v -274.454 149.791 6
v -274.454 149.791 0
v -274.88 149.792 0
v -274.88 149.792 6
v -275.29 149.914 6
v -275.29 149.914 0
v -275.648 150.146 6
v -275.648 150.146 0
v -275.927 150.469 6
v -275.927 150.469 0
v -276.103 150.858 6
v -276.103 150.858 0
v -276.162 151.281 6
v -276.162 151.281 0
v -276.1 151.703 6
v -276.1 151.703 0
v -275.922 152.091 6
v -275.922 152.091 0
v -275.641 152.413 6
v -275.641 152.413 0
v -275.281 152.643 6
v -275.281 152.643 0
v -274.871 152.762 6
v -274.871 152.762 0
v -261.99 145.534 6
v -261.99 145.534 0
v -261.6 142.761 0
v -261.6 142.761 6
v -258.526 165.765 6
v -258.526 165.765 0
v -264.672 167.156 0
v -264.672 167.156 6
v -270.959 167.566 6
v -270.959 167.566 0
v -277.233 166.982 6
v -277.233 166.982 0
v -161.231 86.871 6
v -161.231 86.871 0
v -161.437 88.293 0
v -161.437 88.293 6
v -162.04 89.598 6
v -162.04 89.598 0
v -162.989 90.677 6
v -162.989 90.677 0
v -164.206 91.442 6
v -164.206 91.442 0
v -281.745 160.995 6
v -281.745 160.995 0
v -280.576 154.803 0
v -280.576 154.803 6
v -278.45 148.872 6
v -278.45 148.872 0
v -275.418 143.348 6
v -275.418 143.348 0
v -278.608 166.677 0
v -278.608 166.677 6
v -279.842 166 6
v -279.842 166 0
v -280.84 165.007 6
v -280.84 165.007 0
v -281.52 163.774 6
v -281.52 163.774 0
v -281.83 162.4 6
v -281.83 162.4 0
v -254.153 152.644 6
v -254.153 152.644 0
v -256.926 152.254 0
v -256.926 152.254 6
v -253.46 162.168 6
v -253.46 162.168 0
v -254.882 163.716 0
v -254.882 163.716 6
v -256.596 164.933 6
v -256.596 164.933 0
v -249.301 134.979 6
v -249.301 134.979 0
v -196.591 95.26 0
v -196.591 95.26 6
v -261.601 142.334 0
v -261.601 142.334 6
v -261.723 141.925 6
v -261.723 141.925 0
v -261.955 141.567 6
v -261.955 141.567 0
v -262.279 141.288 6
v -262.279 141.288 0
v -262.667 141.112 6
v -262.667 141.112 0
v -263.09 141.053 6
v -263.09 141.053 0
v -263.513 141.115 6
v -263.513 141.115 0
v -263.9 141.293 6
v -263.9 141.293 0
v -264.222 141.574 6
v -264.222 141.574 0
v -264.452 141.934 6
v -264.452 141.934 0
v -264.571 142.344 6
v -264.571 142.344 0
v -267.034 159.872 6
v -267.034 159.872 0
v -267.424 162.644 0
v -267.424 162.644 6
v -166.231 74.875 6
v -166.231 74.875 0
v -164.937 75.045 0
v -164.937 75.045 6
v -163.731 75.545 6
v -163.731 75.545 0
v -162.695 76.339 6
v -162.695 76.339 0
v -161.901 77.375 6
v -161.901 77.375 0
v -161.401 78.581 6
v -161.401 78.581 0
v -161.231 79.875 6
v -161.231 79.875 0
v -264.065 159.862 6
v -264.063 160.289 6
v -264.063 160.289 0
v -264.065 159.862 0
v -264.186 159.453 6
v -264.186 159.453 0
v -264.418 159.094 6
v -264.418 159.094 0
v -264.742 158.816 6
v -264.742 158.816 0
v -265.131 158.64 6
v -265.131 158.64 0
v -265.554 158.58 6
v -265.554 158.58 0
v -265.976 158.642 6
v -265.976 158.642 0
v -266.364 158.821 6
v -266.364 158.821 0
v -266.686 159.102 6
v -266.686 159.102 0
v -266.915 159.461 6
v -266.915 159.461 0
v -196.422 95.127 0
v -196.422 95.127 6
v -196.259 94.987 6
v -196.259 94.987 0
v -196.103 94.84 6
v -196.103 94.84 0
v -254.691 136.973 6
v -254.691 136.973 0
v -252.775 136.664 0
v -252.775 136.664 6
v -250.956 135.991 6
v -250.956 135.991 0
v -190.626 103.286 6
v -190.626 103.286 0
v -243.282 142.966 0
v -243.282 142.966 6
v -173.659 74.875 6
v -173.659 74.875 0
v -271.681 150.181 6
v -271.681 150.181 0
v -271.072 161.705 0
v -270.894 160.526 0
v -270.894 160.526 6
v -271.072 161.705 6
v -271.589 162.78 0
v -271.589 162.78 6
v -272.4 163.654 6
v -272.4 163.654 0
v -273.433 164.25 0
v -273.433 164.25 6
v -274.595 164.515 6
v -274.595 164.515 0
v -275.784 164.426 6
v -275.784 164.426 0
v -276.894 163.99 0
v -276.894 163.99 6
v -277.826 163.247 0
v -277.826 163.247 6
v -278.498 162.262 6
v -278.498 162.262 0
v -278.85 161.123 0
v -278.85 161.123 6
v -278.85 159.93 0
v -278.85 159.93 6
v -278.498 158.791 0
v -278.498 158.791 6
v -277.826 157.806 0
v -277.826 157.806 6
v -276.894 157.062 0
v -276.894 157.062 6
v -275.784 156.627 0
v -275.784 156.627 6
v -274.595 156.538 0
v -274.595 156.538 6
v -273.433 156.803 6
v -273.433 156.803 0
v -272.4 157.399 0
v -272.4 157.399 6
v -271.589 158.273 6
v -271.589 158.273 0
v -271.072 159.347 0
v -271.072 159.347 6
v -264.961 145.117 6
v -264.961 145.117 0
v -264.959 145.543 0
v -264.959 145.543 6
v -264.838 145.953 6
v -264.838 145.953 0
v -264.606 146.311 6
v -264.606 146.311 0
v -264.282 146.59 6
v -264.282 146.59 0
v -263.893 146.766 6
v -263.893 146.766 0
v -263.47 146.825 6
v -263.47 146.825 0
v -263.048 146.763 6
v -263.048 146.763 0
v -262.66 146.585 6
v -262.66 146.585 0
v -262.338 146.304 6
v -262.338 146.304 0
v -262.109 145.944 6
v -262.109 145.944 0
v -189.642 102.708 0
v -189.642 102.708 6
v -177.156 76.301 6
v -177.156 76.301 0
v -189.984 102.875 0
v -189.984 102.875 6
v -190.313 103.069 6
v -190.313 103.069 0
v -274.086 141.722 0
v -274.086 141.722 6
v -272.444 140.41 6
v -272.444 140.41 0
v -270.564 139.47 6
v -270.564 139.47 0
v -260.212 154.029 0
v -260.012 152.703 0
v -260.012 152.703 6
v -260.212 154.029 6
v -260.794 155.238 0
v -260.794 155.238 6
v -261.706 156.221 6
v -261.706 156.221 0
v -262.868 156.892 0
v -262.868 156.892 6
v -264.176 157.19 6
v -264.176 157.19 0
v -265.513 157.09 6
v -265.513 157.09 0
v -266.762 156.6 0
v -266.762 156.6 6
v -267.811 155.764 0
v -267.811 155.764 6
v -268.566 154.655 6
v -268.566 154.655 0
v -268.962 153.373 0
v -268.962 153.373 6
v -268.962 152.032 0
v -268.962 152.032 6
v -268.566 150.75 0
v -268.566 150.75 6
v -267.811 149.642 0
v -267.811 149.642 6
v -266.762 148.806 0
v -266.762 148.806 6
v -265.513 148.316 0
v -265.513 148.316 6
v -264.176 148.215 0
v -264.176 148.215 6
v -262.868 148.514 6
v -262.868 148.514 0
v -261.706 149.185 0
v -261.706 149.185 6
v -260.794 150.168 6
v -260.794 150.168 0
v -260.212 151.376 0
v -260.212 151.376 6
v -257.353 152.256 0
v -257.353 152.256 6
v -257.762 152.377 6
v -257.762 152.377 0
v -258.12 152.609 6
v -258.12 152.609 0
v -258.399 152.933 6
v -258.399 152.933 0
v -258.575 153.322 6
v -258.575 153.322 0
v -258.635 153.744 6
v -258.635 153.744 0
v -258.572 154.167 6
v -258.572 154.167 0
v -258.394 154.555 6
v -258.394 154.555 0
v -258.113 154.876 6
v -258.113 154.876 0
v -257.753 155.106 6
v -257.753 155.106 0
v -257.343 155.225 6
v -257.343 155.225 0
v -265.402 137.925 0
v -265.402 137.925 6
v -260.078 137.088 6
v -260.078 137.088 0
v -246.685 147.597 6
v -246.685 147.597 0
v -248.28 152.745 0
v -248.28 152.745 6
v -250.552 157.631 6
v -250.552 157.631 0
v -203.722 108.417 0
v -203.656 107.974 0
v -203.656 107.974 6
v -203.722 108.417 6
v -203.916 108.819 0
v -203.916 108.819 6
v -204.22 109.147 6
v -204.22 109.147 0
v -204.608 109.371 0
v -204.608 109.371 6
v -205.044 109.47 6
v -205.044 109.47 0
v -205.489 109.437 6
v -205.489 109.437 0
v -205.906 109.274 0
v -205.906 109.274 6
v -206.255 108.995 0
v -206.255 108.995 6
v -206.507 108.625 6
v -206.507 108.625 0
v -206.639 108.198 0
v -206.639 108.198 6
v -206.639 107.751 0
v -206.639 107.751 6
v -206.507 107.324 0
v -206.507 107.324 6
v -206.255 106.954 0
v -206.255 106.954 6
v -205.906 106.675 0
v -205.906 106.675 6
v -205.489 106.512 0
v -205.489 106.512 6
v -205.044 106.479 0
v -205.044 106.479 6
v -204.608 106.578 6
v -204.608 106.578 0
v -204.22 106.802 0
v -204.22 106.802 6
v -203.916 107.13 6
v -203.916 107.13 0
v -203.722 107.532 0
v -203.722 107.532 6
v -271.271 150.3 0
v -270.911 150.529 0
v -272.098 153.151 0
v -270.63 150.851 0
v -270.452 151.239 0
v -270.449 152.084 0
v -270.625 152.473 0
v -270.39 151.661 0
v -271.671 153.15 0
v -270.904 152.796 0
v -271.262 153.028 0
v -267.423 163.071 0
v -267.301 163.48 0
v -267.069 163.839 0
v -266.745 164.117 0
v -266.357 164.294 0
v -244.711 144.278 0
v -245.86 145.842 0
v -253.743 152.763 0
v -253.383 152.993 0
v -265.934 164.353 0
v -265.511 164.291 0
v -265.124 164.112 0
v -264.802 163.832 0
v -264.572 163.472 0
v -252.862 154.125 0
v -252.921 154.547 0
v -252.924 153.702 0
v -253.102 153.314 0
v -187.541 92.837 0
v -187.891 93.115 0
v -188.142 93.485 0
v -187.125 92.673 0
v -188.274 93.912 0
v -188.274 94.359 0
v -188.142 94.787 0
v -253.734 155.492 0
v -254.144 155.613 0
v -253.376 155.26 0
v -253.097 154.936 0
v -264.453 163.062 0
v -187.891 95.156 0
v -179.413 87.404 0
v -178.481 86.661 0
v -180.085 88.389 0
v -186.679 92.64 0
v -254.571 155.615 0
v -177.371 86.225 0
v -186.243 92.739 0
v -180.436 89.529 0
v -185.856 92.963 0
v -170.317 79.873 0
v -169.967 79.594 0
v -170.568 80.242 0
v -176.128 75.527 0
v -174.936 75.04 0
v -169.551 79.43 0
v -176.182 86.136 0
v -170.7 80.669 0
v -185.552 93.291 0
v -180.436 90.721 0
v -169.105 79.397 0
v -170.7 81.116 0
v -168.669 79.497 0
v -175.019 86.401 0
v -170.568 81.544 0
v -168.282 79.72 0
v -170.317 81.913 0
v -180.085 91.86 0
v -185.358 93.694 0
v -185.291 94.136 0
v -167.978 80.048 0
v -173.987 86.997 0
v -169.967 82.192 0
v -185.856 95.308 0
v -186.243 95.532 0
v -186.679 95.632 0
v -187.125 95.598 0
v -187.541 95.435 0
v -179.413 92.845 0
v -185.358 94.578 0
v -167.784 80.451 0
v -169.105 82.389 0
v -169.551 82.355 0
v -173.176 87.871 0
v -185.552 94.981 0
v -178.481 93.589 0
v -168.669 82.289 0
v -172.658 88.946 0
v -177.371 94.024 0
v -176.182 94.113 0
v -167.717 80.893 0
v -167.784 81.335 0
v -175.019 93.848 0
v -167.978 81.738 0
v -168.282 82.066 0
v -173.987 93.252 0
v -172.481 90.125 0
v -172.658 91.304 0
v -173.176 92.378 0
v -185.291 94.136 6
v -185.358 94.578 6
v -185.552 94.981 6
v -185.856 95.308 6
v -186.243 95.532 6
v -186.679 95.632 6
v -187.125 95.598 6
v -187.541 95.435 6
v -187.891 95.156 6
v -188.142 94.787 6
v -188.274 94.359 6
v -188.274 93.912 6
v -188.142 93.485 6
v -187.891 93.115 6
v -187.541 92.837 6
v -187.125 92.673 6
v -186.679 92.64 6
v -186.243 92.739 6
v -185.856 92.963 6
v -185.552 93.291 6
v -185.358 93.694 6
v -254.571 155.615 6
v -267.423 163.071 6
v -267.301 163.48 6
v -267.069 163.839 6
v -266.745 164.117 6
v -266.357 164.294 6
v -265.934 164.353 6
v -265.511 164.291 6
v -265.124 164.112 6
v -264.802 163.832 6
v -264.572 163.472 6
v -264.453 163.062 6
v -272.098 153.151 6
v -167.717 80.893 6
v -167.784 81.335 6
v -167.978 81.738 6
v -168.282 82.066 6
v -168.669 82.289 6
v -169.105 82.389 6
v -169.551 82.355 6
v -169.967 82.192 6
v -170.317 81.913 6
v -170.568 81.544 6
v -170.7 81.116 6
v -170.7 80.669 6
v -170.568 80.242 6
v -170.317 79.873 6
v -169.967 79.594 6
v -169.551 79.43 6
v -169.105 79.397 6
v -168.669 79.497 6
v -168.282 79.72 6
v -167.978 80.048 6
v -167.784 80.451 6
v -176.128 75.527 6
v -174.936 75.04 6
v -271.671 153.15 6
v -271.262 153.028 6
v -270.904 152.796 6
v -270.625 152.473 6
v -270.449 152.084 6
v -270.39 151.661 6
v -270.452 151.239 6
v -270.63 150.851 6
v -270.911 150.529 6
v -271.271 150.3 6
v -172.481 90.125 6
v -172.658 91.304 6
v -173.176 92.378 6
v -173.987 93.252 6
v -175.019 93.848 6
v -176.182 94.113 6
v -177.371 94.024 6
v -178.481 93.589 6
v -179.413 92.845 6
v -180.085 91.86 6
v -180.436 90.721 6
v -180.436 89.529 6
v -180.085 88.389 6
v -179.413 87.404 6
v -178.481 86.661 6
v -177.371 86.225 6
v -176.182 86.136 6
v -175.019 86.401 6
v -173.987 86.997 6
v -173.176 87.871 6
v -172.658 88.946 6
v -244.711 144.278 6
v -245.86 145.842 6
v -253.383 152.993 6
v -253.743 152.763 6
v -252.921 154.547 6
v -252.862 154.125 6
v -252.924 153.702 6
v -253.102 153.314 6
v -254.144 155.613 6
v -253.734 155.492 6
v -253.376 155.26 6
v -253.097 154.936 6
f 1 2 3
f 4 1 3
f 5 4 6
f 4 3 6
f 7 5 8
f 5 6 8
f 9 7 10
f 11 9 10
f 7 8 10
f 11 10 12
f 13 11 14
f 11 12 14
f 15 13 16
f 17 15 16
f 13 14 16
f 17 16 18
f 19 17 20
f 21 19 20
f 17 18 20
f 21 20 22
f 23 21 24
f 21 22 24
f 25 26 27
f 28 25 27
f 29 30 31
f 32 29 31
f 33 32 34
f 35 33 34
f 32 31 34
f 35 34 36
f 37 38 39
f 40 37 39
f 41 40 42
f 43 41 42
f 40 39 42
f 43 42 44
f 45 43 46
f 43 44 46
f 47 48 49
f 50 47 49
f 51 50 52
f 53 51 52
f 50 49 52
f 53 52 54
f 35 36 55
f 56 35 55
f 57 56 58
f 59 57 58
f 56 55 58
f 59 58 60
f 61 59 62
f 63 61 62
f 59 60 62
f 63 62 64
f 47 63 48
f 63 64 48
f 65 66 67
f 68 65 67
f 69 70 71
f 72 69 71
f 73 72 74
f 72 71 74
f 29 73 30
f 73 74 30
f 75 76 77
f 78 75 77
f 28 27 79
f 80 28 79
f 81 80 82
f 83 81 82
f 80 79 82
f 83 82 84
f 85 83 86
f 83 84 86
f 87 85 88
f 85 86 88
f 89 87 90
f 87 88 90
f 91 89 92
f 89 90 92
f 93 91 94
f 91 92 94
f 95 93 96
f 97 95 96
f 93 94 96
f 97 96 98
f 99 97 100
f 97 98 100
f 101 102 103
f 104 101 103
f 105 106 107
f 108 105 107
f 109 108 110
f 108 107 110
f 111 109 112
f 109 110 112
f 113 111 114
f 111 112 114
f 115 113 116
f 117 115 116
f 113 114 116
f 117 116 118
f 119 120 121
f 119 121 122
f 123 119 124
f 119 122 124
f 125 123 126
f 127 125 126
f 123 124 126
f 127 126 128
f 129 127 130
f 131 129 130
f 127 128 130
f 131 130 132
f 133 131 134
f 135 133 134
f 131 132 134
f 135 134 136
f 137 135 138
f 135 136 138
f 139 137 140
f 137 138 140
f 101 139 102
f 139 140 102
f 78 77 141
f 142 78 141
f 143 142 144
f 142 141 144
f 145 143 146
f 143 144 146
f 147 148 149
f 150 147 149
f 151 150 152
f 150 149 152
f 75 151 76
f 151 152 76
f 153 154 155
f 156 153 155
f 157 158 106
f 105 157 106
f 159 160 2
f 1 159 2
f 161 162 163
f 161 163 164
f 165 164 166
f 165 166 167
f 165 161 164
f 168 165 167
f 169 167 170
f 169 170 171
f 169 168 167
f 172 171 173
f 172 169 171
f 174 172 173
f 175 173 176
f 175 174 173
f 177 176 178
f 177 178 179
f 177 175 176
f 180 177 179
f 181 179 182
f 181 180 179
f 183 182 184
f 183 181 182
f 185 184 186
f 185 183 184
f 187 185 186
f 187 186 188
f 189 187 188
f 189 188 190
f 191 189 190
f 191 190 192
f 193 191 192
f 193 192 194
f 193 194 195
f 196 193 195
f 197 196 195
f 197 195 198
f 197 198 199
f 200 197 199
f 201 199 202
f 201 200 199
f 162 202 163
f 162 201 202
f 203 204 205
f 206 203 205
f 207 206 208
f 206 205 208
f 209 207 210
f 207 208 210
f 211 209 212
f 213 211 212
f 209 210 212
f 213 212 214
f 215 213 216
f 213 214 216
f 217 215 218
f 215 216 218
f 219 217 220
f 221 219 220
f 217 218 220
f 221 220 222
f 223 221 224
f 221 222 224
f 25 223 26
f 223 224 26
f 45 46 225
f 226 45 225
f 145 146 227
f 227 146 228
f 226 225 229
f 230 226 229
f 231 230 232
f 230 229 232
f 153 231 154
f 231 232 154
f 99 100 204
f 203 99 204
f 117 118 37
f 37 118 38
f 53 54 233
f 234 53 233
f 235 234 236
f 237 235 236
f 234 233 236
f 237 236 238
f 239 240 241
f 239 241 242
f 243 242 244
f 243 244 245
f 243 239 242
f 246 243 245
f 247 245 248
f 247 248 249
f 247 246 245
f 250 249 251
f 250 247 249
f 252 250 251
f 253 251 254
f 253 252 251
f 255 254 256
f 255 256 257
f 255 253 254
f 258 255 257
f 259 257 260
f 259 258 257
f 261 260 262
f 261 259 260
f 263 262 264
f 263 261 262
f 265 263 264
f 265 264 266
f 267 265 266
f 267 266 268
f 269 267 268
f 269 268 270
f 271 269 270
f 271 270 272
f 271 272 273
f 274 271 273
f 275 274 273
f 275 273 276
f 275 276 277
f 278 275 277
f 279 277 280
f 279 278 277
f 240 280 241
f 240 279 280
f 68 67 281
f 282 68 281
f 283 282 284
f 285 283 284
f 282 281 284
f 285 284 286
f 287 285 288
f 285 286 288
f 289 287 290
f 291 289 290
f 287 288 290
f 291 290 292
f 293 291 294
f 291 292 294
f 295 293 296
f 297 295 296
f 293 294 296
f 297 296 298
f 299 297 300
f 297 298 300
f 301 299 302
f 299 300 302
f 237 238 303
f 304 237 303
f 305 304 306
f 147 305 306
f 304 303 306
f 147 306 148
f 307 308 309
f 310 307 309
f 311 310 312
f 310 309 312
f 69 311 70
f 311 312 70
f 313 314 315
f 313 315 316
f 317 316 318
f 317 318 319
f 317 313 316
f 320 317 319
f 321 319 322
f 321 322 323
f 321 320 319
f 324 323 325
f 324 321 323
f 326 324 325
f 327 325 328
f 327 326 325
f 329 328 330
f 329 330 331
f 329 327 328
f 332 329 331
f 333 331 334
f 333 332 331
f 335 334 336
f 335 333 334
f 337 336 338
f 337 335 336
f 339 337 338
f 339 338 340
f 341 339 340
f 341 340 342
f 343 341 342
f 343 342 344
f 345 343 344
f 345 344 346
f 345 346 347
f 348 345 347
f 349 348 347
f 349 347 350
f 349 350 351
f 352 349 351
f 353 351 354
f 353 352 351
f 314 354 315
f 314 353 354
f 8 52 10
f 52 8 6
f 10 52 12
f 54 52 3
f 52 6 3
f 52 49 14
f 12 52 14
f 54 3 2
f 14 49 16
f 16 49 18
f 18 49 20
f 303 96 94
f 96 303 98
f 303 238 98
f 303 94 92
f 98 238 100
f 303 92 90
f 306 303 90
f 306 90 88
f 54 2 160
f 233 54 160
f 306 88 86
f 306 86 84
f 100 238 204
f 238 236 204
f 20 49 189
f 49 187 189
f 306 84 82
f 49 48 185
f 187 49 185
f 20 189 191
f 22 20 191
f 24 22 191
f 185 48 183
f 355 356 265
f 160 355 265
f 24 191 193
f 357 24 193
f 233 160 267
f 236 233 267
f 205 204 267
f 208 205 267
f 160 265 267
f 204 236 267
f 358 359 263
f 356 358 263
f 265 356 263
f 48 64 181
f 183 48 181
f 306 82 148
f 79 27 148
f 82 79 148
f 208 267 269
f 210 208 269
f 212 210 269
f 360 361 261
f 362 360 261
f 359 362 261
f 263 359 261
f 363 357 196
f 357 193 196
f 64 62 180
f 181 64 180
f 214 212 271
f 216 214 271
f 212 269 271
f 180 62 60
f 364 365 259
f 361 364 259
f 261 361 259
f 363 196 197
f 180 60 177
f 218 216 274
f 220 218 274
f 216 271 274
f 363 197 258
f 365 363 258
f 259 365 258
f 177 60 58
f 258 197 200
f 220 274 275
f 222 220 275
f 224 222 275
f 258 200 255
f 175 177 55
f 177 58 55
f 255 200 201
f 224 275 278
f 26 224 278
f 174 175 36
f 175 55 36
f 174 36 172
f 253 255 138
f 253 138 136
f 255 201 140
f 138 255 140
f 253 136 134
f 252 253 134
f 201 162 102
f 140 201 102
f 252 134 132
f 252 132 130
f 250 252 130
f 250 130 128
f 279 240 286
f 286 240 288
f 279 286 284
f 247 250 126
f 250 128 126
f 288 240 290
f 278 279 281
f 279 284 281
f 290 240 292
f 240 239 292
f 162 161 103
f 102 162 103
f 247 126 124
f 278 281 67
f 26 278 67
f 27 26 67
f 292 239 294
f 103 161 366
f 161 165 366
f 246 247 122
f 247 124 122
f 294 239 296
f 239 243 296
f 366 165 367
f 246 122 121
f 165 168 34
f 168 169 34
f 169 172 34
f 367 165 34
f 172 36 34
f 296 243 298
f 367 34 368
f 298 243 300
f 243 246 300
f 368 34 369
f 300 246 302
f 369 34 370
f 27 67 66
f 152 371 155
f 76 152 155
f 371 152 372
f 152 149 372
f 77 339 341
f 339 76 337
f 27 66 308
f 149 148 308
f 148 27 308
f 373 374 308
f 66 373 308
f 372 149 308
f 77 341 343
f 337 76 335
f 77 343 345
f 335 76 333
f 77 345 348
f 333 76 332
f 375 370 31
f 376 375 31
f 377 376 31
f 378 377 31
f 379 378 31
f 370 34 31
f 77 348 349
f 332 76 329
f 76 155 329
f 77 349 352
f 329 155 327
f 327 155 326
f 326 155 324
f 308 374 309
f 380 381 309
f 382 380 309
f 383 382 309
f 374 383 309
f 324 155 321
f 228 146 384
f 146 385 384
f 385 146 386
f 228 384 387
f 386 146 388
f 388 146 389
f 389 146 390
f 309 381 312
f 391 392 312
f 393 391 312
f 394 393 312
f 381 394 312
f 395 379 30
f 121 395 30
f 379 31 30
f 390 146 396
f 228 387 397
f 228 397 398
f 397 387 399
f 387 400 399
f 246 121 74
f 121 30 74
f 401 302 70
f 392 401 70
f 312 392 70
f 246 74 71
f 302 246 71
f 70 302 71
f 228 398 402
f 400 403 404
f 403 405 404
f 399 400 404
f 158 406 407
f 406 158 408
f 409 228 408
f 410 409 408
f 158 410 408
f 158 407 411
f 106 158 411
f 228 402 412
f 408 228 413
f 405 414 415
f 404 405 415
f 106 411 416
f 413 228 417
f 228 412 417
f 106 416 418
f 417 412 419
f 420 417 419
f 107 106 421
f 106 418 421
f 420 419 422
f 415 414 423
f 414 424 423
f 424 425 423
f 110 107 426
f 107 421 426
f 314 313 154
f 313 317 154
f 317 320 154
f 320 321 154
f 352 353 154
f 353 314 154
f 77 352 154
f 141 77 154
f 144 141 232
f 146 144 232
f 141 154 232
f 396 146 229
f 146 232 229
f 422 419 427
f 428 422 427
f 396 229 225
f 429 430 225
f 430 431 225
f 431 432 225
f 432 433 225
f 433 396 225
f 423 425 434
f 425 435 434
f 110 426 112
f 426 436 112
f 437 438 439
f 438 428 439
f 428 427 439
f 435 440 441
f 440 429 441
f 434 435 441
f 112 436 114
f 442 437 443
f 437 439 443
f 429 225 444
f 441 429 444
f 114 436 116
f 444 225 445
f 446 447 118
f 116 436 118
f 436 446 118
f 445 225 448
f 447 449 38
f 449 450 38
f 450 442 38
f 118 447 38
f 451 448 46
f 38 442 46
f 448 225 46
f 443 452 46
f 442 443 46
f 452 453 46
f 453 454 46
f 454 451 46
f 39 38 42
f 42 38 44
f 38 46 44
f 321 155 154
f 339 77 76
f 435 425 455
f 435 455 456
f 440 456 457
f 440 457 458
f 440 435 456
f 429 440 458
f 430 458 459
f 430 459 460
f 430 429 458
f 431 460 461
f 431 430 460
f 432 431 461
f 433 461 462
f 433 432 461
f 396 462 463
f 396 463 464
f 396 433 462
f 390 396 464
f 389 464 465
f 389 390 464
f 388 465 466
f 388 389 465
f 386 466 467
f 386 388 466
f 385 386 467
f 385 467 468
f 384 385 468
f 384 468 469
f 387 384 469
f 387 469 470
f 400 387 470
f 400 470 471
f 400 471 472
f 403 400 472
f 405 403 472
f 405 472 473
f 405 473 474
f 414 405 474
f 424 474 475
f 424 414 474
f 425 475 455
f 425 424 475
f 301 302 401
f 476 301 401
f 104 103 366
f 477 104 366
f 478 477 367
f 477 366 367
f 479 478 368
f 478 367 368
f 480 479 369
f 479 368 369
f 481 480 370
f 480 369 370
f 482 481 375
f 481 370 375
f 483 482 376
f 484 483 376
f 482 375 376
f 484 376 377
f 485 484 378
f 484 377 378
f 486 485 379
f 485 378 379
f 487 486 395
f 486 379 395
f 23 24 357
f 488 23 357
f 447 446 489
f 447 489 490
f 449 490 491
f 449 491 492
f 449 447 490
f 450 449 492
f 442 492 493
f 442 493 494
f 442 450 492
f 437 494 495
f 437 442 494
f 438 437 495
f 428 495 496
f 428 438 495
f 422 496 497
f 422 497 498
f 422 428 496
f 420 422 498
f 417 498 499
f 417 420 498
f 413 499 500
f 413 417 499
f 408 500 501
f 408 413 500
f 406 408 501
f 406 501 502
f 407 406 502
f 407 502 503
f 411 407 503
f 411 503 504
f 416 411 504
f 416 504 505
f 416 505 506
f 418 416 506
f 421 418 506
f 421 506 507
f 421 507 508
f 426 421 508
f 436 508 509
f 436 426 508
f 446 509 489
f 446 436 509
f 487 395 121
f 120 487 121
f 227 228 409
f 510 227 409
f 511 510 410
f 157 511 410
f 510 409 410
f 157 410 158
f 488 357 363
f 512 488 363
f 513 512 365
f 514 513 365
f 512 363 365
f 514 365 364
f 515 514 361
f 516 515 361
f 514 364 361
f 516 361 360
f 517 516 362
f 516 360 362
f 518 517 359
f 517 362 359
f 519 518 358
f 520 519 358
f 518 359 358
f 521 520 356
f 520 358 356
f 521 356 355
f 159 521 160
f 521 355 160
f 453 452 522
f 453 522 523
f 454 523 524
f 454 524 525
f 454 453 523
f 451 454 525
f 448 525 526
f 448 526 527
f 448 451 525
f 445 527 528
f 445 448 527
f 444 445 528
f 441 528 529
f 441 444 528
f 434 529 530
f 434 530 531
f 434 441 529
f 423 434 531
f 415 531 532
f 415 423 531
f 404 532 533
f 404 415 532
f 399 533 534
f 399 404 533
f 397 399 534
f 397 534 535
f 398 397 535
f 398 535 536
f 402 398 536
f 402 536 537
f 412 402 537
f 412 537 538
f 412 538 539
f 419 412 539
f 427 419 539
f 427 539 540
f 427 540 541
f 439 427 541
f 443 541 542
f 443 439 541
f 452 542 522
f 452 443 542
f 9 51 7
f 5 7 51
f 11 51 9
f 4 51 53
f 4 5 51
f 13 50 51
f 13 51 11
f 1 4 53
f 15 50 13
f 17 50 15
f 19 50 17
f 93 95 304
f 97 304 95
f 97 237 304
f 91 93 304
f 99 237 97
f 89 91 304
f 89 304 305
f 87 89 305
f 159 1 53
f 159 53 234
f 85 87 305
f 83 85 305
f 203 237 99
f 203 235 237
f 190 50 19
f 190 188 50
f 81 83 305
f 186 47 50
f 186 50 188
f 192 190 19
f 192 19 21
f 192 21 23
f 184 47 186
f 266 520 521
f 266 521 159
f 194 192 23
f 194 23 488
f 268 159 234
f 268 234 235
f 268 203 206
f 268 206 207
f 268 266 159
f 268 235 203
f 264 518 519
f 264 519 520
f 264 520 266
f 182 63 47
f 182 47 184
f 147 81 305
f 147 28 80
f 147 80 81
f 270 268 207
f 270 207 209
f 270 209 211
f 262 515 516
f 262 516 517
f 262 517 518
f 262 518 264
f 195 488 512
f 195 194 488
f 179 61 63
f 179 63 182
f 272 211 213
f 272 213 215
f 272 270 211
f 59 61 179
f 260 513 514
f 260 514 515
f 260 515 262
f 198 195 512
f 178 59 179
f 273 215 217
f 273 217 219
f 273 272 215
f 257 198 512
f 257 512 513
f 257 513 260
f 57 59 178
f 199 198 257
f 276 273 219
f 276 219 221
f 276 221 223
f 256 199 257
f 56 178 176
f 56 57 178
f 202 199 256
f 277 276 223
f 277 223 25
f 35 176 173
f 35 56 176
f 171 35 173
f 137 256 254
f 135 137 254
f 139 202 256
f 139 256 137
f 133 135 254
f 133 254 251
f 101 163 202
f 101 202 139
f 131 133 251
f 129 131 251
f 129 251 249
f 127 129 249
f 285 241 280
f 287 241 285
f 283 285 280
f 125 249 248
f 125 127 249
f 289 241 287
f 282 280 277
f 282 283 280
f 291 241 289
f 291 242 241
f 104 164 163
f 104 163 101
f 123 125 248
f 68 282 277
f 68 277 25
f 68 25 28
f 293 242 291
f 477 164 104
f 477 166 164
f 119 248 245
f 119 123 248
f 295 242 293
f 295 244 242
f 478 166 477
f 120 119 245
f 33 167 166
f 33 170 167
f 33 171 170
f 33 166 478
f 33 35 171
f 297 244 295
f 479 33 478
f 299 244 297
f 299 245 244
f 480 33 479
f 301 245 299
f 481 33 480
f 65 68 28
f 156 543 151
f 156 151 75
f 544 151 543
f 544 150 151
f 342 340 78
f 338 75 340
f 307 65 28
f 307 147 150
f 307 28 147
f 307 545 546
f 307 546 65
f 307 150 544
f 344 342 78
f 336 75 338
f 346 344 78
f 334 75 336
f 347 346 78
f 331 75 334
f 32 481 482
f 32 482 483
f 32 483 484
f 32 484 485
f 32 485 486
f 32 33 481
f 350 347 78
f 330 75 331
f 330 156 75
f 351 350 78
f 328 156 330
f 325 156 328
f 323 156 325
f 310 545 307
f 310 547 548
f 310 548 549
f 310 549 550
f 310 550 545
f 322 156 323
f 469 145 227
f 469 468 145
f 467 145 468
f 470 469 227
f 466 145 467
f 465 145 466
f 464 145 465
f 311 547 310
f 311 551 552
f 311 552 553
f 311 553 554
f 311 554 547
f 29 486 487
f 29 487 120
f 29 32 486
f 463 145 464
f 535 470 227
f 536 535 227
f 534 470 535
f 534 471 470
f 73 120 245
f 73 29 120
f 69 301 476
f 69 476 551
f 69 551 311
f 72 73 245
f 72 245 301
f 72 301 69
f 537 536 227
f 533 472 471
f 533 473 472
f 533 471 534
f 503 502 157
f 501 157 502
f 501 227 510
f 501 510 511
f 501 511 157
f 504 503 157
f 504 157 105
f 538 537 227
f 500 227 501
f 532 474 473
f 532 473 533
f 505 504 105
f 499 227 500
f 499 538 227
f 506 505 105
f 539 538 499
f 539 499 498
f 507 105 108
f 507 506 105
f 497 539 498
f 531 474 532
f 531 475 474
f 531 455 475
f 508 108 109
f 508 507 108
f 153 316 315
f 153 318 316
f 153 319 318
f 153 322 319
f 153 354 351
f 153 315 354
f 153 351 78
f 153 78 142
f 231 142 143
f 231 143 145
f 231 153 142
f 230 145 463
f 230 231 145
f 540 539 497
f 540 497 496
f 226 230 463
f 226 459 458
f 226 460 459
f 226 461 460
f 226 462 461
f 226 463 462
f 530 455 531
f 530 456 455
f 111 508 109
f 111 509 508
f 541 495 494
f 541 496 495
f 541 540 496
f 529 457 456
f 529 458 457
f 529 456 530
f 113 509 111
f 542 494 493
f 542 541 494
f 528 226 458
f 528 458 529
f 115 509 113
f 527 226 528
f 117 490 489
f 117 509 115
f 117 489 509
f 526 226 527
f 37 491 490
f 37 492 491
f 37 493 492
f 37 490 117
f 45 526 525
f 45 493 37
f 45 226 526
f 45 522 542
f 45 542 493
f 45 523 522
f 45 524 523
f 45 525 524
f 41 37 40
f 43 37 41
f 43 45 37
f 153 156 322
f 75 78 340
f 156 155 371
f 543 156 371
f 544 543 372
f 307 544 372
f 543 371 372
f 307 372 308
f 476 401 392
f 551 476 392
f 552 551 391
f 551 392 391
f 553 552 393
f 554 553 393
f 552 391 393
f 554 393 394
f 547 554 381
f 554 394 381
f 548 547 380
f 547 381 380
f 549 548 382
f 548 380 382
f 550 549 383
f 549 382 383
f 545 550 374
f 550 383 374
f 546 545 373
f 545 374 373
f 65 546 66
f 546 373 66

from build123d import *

# Parameters (mm, degrees)
CROQUIS1_R              = 1.5
CROQUIS1_R_2            = 4
CROQUIS1_R_3            = 4.5
SALIENTE_EXTRUIR1_DEPTH = 6


with BuildPart() as part:
    # Croquis1 → Saliente-Extruir1 (new body)
    with BuildSketch(Plane.XY):
        with BuildLine():
            ThreePointArc((-166.230647244, 74.874670253), (-162.695113338, 76.339136347), (-161.230647244, 79.874670253))
            Line((-161.230647244, 79.874670253), (-161.230647244, 86.870701075))
            ThreePointArc((-161.230647244, 86.870701075), (-162.039949935, 89.59798105), (-164.20586967, 91.442383017))
            Line((-164.20586967, 91.442383017), (-189.641602091, 102.707755643))
            ThreePointArc((-189.641602091, 102.707755643), (-190.150317176, 102.968821046), (-190.625899632, 103.286260034))
            Line((-190.625899632, 103.286260034), (-243.282498112, 142.965853083))
            ThreePointArc((-243.282498112, 142.965853083), (-245.323514753, 145.031918552), (-246.684791002, 147.597323475))
            ThreePointArc((-246.684791002, 147.597323475), (-249.33333249, 155.226277836), (-253.46024382, 162.167770437))
            ThreePointArc((-253.46024382, 162.167770437), (-255.706791789, 164.36963499), (-258.526200935, 165.764668091))
            ThreePointArc((-258.526200935, 165.764668091), (-267.807267276, 167.484933762), (-277.233031605, 166.98246665))
            ThreePointArc((-277.233031605, 166.98246665), (-280.839635864, 165.006508056), (-281.744934312, 160.994969527))
            ThreePointArc((-281.744934312, 160.994969527), (-279.629843944, 151.795844616), (-275.418009863, 143.348480526))
            ThreePointArc((-275.418009863, 143.348480526), (-273.299883496, 141.022813744), (-270.564082899, 139.470209357))
            ThreePointArc((-270.564082899, 139.470209357), (-262.753961023, 137.416502238), (-254.690502443, 136.973385563))
            ThreePointArc((-254.690502443, 136.973385563), (-251.84925837, 136.371964278), (-249.300648344, 134.979497983))
            Line((-249.300648344, 134.979497983), (-196.590704681, 95.259706455))
            ThreePointArc((-196.590704681, 95.259706455), (-196.340024178, 95.057833866), (-196.102851224, 94.840251132))
            Line((-196.102851224, 94.840251132), (-177.15641917, 76.300948025))
            ThreePointArc((-177.15641917, 76.300948025), (-175.547795242, 75.244950437), (-173.659490598, 74.874670253))
            Line((-173.659490598, 74.874670253), (-166.230647244, 74.874670253))
        make_face()
        with Locations((-169.217002345, 80.892820484)):
            Circle(CROQUIS1_R, mode=Mode.SUBTRACT)
        with Locations((-176.480647244, 90.124670253)):
            Circle(CROQUIS1_R_2, mode=Mode.SUBTRACT)
        with Locations((-186.790930649, 94.135725334)):
            Circle(CROQUIS1_R, mode=Mode.SUBTRACT)
        with Locations((-205.155600297, 107.974496526)):
            Circle(CROQUIS1_R, mode=Mode.SUBTRACT)
        with BuildLine():
            Line((-261.989778965, 145.534030037), (-261.600094282, 142.761279445))
            ThreePointArc((-261.600094282, 142.761279445), (-262.876736734, 141.06711769), (-264.570898489, 142.343760142))
            Line((-264.570898489, 142.343760142), (-264.960583171, 145.116510734))
            ThreePointArc((-264.960583171, 145.116510734), (-263.68394072, 146.810672489), (-261.989778965, 145.534030037))
        make_face(mode=Mode.SUBTRACT)
        with BuildLine():
            Line((-271.680758131, 150.180525793), (-274.453508724, 149.79084111))
            ThreePointArc((-274.453508724, 149.79084111), (-276.147670478, 151.067483562), (-274.871028026, 152.761645316))
            Line((-274.871028026, 152.761645316), (-272.098277434, 153.151329999))
            ThreePointArc((-272.098277434, 153.151329999), (-270.404115679, 151.874687547), (-271.680758131, 150.180525793))
        make_face(mode=Mode.SUBTRACT)
        with Locations((-264.51202067, 152.702767498)):
            Circle(CROQUIS1_R_3, mode=Mode.SUBTRACT)
        with BuildLine():
            Line((-257.34328321, 155.225009203), (-254.570532617, 155.614693886))
            ThreePointArc((-254.570532617, 155.614693886), (-252.876370863, 154.338051434), (-254.153013314, 152.64388968))
            Line((-254.153013314, 152.64388968), (-256.925763907, 152.254204997))
            ThreePointArc((-256.925763907, 152.254204997), (-258.619925661, 153.530847449), (-257.34328321, 155.225009203))
        make_face(mode=Mode.SUBTRACT)
        with Locations((-274.894282301, 160.526362799)):
            Circle(CROQUIS1_R_2, mode=Mode.SUBTRACT)
        with BuildLine():
            Line((-267.034262376, 159.871504959), (-267.423947058, 162.644255551))
            ThreePointArc((-267.423947058, 162.644255551), (-266.147304607, 164.338417306), (-264.453142852, 163.061774854))
            Line((-264.453142852, 163.061774854), (-264.063458169, 160.289024262))
            ThreePointArc((-264.063458169, 160.289024262), (-265.340100621, 158.594862507), (-267.034262376, 159.871504959))
        make_face(mode=Mode.SUBTRACT)
    extrude(amount=SALIENTE_EXTRUIR1_DEPTH)


solid = part.part
